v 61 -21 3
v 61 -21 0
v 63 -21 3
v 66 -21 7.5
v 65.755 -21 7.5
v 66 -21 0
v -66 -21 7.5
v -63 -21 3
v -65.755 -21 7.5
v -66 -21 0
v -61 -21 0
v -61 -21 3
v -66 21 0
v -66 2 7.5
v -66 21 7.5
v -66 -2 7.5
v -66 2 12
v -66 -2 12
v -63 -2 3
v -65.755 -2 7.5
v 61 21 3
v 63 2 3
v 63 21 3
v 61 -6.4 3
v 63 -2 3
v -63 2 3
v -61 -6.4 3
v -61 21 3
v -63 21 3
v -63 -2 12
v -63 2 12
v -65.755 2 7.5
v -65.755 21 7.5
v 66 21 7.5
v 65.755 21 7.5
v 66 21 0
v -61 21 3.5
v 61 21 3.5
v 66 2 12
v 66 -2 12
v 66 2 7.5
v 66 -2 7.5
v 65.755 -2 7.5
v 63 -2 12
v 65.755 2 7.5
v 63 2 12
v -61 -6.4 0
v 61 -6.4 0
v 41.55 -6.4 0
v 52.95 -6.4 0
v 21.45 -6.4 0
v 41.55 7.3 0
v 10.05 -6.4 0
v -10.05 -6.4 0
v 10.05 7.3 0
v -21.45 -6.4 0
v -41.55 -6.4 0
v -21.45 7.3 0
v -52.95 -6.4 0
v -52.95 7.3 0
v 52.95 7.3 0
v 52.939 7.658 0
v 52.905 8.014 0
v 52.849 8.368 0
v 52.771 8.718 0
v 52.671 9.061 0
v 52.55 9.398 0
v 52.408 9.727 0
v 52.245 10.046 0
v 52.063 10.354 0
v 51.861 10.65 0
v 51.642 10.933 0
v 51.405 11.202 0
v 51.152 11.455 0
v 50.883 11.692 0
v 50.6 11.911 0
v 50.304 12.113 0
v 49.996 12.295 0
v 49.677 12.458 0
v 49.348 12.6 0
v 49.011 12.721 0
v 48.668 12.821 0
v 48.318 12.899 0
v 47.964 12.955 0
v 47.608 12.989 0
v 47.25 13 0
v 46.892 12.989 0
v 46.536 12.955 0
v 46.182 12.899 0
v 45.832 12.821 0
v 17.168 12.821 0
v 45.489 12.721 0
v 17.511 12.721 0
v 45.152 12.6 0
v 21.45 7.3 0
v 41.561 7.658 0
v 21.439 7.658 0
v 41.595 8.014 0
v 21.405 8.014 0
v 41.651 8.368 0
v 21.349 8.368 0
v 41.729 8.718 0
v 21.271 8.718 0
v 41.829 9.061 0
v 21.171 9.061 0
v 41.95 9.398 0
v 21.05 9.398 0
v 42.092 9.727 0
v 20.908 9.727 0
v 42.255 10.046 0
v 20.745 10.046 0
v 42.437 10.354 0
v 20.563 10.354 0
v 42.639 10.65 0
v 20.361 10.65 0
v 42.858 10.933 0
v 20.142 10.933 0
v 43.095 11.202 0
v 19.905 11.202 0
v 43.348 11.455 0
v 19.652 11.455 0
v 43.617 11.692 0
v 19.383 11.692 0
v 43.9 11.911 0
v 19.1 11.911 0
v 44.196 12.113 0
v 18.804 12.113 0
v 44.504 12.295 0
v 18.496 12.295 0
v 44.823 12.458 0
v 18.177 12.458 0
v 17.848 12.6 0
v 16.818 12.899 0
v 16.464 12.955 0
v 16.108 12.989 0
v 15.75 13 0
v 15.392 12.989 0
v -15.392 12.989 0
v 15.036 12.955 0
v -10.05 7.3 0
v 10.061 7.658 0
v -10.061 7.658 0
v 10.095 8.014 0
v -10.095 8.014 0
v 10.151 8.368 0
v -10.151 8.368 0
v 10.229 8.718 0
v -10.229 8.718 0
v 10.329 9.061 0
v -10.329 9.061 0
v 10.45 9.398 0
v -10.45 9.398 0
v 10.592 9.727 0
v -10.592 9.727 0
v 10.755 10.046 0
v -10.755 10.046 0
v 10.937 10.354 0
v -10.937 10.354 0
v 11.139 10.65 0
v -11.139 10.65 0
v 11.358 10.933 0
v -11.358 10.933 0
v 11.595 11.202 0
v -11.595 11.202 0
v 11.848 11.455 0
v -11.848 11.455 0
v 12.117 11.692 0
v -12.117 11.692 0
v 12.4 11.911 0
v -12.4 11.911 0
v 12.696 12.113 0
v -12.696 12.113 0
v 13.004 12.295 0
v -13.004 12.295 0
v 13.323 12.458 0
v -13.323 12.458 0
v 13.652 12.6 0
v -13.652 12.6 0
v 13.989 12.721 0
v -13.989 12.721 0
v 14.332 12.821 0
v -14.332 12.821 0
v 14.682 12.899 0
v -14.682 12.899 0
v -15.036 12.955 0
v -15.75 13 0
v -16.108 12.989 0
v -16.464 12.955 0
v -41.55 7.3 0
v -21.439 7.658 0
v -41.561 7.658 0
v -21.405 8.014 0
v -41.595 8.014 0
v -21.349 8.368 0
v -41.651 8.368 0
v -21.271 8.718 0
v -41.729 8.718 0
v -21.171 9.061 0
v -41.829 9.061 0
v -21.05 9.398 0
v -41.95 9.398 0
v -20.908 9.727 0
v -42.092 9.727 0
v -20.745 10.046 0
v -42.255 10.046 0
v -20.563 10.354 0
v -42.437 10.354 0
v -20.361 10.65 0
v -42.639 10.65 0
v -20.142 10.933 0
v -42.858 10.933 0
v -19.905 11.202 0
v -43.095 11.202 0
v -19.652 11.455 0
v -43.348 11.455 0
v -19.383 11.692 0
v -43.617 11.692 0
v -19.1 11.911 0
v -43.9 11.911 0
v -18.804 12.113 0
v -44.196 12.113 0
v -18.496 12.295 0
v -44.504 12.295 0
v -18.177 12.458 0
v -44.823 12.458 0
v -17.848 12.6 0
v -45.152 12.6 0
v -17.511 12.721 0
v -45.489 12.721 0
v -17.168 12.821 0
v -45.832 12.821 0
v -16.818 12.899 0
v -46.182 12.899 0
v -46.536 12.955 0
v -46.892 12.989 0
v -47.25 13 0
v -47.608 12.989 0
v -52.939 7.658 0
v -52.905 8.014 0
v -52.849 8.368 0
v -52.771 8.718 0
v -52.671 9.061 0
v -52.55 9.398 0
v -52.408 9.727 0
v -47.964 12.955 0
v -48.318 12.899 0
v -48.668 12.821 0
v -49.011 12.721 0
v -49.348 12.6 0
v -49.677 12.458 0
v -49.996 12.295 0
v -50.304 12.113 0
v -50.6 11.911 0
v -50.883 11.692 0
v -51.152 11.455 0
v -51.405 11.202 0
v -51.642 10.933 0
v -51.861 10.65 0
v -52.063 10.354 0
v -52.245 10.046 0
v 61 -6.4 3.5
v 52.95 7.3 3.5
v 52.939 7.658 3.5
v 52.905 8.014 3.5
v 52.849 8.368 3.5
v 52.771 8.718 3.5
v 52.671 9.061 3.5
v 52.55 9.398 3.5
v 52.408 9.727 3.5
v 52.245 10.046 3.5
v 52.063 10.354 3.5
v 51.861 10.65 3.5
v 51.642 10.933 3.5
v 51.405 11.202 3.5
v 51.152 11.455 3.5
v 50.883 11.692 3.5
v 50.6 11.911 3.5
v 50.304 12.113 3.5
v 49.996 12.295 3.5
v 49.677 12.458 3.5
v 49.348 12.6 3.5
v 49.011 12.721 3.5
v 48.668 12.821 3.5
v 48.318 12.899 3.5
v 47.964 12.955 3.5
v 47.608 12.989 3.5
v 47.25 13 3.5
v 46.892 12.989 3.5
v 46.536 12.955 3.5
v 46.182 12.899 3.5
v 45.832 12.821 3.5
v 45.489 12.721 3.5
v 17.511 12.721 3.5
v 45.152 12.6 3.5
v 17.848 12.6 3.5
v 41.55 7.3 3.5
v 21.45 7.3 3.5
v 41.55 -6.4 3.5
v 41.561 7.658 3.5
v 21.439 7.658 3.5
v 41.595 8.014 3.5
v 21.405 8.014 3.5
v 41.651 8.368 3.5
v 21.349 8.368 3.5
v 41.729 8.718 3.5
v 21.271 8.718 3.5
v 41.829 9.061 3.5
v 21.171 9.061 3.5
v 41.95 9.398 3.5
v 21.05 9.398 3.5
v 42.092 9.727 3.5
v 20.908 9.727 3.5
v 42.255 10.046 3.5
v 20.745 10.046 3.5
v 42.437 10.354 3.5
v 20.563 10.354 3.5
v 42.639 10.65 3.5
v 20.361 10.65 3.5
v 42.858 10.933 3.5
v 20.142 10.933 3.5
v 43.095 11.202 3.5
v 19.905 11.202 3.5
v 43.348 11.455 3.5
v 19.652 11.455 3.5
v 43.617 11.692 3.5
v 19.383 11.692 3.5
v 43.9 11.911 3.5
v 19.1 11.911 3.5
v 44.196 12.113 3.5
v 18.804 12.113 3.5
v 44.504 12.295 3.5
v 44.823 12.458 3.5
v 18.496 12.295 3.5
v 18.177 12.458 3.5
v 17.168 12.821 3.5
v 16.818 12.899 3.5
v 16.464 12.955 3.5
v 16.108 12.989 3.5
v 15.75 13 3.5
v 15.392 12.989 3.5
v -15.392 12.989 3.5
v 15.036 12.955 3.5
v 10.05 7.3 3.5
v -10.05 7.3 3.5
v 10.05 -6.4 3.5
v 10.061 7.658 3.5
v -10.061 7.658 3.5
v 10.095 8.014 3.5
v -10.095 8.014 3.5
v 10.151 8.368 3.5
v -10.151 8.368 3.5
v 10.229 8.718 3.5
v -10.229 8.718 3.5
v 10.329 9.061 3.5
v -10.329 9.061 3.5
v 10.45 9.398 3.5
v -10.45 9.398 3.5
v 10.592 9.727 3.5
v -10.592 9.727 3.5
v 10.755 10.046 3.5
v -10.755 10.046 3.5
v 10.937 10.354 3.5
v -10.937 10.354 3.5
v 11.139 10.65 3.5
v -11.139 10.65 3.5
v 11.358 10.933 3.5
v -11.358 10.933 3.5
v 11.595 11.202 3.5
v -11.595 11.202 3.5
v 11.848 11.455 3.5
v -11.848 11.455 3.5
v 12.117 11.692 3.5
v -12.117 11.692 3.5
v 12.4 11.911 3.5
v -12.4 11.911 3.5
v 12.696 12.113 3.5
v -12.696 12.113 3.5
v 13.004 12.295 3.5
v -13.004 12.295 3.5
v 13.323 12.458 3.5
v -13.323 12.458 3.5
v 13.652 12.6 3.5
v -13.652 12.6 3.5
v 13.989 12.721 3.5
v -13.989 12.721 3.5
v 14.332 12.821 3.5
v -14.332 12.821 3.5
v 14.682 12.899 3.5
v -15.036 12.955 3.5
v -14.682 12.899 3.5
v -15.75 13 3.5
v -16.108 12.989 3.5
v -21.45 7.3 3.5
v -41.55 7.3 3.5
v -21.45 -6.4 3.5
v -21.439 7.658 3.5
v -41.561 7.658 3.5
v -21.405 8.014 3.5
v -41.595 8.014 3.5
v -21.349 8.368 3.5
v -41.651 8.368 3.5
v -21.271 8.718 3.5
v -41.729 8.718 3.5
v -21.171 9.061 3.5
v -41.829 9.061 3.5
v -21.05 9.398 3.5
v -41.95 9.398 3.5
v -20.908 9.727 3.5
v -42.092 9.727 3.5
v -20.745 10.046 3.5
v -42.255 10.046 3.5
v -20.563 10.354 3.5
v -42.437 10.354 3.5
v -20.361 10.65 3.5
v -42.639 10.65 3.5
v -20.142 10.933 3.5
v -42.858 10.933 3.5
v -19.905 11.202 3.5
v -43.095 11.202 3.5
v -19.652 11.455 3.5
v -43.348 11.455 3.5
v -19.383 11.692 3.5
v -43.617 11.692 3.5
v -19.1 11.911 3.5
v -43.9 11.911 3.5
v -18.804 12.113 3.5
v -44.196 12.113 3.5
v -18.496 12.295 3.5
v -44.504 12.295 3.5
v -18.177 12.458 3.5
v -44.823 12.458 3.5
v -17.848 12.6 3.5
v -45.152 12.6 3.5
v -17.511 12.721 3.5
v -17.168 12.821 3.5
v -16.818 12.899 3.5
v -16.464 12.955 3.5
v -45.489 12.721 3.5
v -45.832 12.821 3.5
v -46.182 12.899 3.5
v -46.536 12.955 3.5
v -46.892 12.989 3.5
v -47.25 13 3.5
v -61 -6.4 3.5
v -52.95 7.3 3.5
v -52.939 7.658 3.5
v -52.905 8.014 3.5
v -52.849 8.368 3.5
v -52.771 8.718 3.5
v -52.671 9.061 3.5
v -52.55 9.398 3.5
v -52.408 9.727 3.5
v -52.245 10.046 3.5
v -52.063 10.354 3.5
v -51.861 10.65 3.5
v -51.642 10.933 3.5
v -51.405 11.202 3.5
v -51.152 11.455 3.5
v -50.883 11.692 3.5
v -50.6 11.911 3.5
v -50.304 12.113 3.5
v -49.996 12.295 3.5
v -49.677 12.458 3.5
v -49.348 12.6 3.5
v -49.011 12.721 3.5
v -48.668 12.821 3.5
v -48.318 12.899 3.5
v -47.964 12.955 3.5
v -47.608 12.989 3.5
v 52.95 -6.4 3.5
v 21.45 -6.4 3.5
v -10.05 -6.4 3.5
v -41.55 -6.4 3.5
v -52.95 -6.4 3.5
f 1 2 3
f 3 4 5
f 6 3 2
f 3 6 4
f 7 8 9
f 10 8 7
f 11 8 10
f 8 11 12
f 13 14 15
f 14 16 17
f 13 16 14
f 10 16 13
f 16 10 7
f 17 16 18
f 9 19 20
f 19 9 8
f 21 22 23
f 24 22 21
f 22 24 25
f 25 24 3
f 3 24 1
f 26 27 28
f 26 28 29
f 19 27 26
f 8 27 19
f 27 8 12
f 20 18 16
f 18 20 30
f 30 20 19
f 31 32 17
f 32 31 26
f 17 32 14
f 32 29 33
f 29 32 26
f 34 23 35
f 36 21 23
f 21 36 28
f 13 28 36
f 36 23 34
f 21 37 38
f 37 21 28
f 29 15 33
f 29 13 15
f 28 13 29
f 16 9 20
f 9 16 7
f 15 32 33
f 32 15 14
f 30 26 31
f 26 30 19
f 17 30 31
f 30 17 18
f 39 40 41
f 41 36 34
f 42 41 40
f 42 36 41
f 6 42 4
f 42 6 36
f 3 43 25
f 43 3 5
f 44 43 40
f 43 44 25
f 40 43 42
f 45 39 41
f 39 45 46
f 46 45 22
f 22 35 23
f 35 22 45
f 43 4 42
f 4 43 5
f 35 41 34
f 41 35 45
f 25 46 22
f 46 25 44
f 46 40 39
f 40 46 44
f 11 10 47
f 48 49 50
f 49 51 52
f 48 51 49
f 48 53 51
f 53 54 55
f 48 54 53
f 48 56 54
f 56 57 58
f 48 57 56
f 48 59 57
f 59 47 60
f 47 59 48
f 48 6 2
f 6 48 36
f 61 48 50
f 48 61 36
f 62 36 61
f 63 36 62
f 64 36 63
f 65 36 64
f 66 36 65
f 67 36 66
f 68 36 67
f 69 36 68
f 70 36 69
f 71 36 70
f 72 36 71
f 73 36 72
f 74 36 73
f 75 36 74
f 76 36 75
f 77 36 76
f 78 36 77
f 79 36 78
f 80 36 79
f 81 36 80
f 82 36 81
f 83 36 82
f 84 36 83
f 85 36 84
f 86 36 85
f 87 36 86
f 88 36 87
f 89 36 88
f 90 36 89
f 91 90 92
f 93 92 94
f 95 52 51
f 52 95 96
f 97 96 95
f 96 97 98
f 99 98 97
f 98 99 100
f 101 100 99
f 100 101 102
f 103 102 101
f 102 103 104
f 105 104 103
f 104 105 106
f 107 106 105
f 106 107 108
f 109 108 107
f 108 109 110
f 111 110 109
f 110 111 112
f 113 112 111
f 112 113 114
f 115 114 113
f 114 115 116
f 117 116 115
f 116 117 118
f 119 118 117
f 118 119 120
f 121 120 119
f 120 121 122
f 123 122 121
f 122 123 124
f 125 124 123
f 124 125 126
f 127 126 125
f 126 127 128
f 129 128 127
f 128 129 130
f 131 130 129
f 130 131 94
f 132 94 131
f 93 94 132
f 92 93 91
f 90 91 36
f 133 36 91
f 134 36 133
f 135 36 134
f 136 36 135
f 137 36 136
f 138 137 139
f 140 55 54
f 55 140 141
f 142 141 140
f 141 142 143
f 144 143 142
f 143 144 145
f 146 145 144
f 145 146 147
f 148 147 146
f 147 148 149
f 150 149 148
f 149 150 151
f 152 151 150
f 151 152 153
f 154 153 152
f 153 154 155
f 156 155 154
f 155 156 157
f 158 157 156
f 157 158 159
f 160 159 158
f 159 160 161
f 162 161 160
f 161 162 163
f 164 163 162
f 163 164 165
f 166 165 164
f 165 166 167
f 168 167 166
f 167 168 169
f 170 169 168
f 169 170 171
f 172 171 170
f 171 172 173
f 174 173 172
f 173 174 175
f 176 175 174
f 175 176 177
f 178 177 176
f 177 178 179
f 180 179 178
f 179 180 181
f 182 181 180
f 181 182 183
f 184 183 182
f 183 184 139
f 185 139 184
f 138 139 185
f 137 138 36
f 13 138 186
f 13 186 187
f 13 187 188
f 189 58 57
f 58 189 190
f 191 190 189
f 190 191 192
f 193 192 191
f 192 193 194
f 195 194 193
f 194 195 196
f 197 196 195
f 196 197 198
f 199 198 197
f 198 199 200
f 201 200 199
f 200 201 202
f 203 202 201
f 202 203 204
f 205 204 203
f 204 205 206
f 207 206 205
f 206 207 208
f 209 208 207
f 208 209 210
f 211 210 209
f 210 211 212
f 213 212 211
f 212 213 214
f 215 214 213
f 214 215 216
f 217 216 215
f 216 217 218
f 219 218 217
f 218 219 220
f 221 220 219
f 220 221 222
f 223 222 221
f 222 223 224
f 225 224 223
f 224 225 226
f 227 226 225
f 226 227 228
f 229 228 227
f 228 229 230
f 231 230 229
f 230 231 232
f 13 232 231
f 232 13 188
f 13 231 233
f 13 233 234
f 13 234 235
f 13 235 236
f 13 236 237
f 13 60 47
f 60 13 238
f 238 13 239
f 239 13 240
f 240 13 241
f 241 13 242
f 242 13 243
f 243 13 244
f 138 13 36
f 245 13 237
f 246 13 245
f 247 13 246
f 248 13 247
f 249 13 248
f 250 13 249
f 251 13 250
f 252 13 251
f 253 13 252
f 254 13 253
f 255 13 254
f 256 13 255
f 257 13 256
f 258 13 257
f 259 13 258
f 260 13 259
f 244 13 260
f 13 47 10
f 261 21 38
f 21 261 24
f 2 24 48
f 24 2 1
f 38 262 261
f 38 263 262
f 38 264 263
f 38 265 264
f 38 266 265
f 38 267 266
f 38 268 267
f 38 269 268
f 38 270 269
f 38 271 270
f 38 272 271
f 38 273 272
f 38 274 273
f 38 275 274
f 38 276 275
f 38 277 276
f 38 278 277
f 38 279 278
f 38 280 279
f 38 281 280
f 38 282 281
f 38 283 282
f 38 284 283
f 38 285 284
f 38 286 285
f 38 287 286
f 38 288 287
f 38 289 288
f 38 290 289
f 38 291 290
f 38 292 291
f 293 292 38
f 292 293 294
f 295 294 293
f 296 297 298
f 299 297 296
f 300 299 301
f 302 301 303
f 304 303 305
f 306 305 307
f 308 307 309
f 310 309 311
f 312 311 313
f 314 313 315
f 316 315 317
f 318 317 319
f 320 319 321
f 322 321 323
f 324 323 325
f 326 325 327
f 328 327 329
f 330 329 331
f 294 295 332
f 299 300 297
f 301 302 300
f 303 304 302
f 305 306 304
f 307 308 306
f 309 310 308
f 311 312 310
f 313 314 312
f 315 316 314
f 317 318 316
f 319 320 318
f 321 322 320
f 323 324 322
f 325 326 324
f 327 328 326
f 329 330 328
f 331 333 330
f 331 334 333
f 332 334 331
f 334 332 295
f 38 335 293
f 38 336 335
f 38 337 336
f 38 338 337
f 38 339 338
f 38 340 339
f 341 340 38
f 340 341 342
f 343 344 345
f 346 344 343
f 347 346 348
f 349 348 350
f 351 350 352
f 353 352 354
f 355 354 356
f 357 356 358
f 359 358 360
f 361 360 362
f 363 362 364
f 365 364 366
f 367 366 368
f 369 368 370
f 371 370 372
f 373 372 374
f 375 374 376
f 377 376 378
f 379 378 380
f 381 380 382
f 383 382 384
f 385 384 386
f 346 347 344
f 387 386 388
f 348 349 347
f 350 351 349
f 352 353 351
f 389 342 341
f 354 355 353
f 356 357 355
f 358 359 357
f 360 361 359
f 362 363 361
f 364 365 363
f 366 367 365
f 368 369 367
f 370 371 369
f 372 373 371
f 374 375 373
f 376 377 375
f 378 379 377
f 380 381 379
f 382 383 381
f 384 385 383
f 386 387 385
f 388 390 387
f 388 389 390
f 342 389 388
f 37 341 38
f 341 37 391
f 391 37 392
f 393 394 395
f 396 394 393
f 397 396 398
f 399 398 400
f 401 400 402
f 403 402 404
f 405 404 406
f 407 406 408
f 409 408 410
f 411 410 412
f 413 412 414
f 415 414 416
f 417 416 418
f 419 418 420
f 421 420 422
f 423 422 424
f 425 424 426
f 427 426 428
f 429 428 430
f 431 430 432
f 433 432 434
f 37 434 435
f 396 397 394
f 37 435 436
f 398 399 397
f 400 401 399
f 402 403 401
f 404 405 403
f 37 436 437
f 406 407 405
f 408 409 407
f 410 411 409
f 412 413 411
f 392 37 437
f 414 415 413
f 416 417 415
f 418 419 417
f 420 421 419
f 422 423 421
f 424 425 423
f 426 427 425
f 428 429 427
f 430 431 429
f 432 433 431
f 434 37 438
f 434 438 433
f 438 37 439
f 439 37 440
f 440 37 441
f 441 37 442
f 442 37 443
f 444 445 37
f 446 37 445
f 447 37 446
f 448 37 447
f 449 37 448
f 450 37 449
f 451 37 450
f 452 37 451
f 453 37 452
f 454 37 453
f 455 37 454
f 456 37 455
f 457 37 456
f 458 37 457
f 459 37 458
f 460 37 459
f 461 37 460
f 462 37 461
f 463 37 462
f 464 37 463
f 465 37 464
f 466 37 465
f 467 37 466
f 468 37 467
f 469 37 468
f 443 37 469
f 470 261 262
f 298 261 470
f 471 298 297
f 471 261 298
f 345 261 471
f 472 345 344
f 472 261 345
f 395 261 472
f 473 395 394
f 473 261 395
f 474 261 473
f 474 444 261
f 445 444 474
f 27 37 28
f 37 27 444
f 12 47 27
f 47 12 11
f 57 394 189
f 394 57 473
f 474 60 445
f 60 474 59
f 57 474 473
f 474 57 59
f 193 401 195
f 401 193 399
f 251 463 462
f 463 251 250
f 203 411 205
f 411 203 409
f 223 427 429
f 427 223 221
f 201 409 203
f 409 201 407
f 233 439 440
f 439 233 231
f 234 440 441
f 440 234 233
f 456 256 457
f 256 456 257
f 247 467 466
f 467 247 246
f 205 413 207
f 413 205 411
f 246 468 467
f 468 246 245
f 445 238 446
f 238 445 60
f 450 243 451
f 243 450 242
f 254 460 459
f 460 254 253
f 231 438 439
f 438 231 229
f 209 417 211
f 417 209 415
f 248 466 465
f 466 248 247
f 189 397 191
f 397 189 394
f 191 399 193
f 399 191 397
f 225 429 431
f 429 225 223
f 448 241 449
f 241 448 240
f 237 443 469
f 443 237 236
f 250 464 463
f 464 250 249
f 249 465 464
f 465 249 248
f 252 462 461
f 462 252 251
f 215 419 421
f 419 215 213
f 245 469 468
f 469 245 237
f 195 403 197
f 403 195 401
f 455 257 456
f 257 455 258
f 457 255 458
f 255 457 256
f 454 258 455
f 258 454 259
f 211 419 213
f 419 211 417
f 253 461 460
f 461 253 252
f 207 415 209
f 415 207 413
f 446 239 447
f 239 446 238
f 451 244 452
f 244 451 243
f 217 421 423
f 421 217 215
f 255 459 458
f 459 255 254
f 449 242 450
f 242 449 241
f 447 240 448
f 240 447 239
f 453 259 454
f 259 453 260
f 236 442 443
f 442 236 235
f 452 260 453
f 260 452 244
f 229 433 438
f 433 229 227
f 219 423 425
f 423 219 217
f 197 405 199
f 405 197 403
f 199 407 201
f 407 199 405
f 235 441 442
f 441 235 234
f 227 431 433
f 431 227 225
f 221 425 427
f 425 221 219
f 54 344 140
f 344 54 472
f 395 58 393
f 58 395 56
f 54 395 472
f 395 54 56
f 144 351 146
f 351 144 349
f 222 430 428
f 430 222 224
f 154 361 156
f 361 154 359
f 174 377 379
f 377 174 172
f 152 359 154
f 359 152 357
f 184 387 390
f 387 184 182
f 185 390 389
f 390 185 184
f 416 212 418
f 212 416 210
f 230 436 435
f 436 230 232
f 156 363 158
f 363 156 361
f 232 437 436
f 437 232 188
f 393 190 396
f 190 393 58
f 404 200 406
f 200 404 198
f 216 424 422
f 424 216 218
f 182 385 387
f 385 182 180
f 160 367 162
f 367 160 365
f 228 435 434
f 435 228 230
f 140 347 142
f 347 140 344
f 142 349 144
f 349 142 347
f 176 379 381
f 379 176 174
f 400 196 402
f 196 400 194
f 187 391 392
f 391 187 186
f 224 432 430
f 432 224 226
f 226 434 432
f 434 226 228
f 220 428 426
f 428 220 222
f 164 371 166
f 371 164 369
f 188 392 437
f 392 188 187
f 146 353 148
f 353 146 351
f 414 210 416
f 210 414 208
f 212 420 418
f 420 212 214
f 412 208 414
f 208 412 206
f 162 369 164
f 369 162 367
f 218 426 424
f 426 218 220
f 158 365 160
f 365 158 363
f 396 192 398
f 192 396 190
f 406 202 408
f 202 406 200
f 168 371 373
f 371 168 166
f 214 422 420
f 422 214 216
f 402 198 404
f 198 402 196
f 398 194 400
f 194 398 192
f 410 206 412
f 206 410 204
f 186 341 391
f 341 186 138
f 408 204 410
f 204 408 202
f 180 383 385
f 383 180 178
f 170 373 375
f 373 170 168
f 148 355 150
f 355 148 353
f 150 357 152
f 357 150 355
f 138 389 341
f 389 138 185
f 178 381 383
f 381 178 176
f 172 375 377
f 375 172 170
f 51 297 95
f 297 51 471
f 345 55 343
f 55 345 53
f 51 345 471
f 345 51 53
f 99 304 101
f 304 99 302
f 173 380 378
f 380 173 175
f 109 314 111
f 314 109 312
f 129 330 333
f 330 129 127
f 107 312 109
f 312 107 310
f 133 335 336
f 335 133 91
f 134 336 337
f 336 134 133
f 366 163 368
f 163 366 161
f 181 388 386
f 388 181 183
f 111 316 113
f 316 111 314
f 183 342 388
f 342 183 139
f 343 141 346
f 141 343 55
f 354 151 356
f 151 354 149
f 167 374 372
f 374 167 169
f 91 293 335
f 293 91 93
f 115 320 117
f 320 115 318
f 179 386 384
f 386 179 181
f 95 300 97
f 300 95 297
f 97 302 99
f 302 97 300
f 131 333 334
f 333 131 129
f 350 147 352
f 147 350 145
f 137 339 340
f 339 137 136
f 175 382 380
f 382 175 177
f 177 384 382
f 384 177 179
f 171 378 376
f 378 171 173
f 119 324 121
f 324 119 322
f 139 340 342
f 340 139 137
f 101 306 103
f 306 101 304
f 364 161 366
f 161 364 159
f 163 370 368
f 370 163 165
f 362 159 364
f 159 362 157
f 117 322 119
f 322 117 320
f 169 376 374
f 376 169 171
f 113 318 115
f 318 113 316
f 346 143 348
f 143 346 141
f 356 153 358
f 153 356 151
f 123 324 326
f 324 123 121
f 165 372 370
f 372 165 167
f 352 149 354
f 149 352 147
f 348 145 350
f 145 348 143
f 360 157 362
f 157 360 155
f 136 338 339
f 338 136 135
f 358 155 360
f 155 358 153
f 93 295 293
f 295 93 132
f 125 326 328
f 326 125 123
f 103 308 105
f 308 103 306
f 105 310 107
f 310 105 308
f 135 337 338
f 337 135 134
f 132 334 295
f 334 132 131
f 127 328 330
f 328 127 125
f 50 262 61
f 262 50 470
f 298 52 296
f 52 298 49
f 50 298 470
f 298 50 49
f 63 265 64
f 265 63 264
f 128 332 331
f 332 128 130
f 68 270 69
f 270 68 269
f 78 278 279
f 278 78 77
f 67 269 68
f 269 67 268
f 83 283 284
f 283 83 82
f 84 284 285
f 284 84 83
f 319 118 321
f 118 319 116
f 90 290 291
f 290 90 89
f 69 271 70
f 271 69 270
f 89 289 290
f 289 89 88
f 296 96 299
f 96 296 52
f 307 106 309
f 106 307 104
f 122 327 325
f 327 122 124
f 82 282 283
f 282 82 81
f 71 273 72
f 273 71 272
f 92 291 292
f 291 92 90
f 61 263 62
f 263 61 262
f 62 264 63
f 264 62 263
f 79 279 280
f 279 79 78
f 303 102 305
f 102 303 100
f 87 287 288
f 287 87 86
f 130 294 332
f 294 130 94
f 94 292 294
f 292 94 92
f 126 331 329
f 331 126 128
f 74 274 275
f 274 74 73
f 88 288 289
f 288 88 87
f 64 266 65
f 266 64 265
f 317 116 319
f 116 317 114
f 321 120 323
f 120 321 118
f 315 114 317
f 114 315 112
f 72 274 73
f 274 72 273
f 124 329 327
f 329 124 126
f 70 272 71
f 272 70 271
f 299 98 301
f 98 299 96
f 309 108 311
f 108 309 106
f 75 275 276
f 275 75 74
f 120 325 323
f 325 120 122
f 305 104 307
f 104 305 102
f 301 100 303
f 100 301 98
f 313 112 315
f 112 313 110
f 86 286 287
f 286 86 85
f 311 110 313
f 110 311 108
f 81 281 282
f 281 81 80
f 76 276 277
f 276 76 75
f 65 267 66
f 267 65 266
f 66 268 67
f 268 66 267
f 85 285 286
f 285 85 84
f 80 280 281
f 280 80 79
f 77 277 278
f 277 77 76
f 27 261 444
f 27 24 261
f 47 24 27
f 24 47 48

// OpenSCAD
// file: constants.scad
// Copyright Ian G. Clifton 2026
// Apache 2.0 license
// https://github.com/IanGClifton/modular-paint-stack

GRIDFINITY_DIMENSION = 42;
CIRCLE_RESOLUTION = 100;

SHELF_SUPPORT_WIDTH = 3;
SHELF_SUPPORT_BLOCK_PROTRUSION = 9;
SHELF_SUPPORT_BLOCK_X = 3;
SHELF_SUPPORT_BLOCK_Y = 4;
SHELF_SUPPORT_ANGLE_X = 3;
SHELF_SUPPORT_ANGLE_Y = (GRIDFINITY_DIMENSION - SHELF_SUPPORT_BLOCK_Y) / 2;
SHELF_SUPPORT_ANGLE_PROTRUSION = 4.9;
SHELF_SUPPORT_SPACING = 2;
SHELF_SUPPORT_ANGLE_CUT = 0.4;

SHELF_THICKNESS = 3;
SHELF_MIN_BACK_RAIL = 8;

SIDE_X = 8;
SIDE_Y = GRIDFINITY_DIMENSION;

DOVETAIL_XMIN = 3.0;
DOVETAIL_XMAX = 4.0;
DOVETAIL_YDEPTH = 3.0;
DOVETAIL_ZDIFF = 5.0;
DOVETAIL_ZMAX = 30.0;
DOVETAIL_ZMIN = DOVETAIL_ZMAX - DOVETAIL_ZDIFF;
DOVETAIL_OFFSET = (SIDE_X / 2) - (DOVETAIL_XMAX / 2);

SHELF_BRACKET_WIDTH = 2;
SHELF_BRACKET_OPENING_HEIGHT = 5;
SHELF_BRACKET_OPENING_WIDTH = 3;
SHELF_BRACKET_CONNECTION_HEIGHT = 4;
SHELF_BRACKET_Y_DEPTH = 19;
SHELF_BRACKET_Y_GAP = 4;

CUTOUT_SHAPE_NONE = 0;
CUTOUT_SHAPE_OVAL = 1;
CUTOUT_SHAPE_RECTANGLE = 2;
CUTOUT_SHAPE_ANGLED_RECTANGLE = 3;

function getShelfMainWidth(gridfinityUnits) = GRIDFINITY_DIMENSION * gridfinityUnits;

function getShelfFullWidth(gridfinityUnits) = (SHELF_SUPPORT_WIDTH * 2) + getShelfMainWidth(gridfinityUnits);
// file: shelf_base.scad
// Copyright Ian G. Clifton 2026
// Apache 2.0 license
// https://github.com/IanGClifton/modular-paint-stack

include <constants.scad>

/**
  * Creates an empty shelf
  *
  * The shelf has the support pieces to fit into the walls,
  * but the top of the shelf is flat with no cutouts for
  * paints, brushes, etc.
  */
module uniformShelf(gridfinityWidth) {
    union() {
        // Shelf main
        cube([getShelfFullWidth(gridfinityWidth), GRIDFINITY_DIMENSION, SHELF_THICKNESS]);
        
        // Support on each end
        shelfSupport();
        translate([getShelfFullWidth(gridfinityWidth), 0, 0])
            mirror([1, 0, 0])
                shelfSupport();
    }
}

/**
  * Modifies the uniformShelf() to be thicker or thinner
  *
  * This adjusts only the center of the shelf where paints
  * would go, allowing the thickness of this part of the shelf
  * to match the paint neck height.
  */
module thicknessAdjustedShelf(gridfinityWidth, targetThickness) {
    if (targetThickness == SHELF_THICKNESS) {
        uniformShelf(gridfinityWidth);
    } else if (targetThickness > SHELF_THICKNESS) {
        // Thicken the shelf
        union() {
            uniformShelf(gridfinityWidth);
            translate([SHELF_SUPPORT_WIDTH + SHELF_SUPPORT_SPACING, 0, SHELF_THICKNESS])
                cube([getShelfMainWidth(gridfinityWidth) - (SHELF_SUPPORT_SPACING * 2), GRIDFINITY_DIMENSION, targetThickness - SHELF_THICKNESS]);
        }
    } else {
        // Thin the shelf
        difference() {
            uniformShelf(gridfinityWidth);
            translate([SHELF_SUPPORT_WIDTH + SHELF_SUPPORT_SPACING, 0, targetThickness])
                cube([getShelfMainWidth(gridfinityWidth) - (SHELF_SUPPORT_SPACING * 2), GRIDFINITY_DIMENSION, SHELF_THICKNESS - targetThickness]);
        }
    }
}

/**
  * Creates the two triangles and center block used to connect
  * the shelf to the shelf brackets on the sides
  */
module shelfSupport() {
    topPoint = SHELF_THICKNESS + SHELF_SUPPORT_ANGLE_PROTRUSION;
    triangle_points = [
        // Front
        [0, 0, topPoint],                             // 0 TL
        [SHELF_SUPPORT_BLOCK_X, 0, SHELF_THICKNESS],  // 1 BR
        [0, 0, SHELF_THICKNESS],                      // 2 BL
        // Back
        [0, SHELF_SUPPORT_ANGLE_Y, topPoint],                            // 3 TL
        [SHELF_SUPPORT_BLOCK_X, SHELF_SUPPORT_ANGLE_Y, SHELF_THICKNESS], // 4 BR
        [0, SHELF_SUPPORT_ANGLE_Y, SHELF_THICKNESS]                      // 5 BL
    ];
    triangle_faces = [
        [0, 1, 2],    // Front face
        [3, 5, 4],    // Back face
        [3, 0, 2, 5], // Left side
        [3, 4, 1, 0], // Top
        [2, 1, 4, 5]  // Bottom  
    ];
    triangle_offset = SHELF_SUPPORT_ANGLE_Y + SHELF_SUPPORT_BLOCK_Y;
    union() {
        difference() {
            // Two triangles
            for (i = [0 : 1]) {
                translate([0, i * triangle_offset, 0])
                polyhedron(points = triangle_points, faces = triangle_faces);
            }
            // Cube to "cut" the tip of the triangles
            translate([0, 0, topPoint - SHELF_SUPPORT_ANGLE_CUT])
                cube([SHELF_SUPPORT_BLOCK_X, (SHELF_SUPPORT_ANGLE_Y * 2) + SHELF_SUPPORT_BLOCK_Y, SHELF_SUPPORT_ANGLE_CUT]);
        }
        // Add the block protrusion
        translate([0, SHELF_SUPPORT_ANGLE_Y, SHELF_THICKNESS])
            cube([SHELF_SUPPORT_BLOCK_X, SHELF_SUPPORT_BLOCK_Y, SHELF_SUPPORT_BLOCK_PROTRUSION]);
    }
}
// main file
// Copyright Ian G. Clifton 2026
// Apache 2.0 license
// https://github.com/IanGClifton/modular-paint-stack

// mm thickness between the paint cap and paint tube body
paint_neck_height = 3.5;
// mm diameter of the paint tube's "neck"
paint_neck_diameter = 11.4;
// Number of cutouts for paint
paint_count = 4;
// mm extra to extend paint supports if possible
paint_support_extra_length = 8;
// Gridfinity units (42mm each) to make the width of the inner shelf part  
shelf_gridfinity_unit_width = 3;

include <shelf_base.scad>

// Calculate the paint holes
PAINT_SPACING = (getShelfMainWidth(shelf_gridfinity_unit_width) - (paint_count * paint_neck_diameter)) / paint_count;
PAINT_CUT_Z = max(SHELF_THICKNESS, paint_neck_height);
PAINT_FINGER_Y = max(GRIDFINITY_DIMENSION - (SHELF_MIN_BACK_RAIL + paint_neck_diameter + paint_support_extra_length), 0);

/**
  * Creates a rectangle and a circle to cut out where the paint tube slides in
  *
  * yDepth distance from the start to the end of the rect that aligns with the circle center
  * diameter width of the circle and the rectangle
  * thickness how tall the rectangle is and how high to extrude the circle
*/
module roundHoleCutOut(yDepth, diameter, thickness) {
    union() {
        cube([diameter, yDepth, thickness]);
        translate([diameter / 2, yDepth]) 
            linear_extrude(thickness)
                circle(d = diameter, $fn=CIRCLE_RESOLUTION);        
    }
}

/**
  * Creates the cutting "tool" that will represents what should be removed
  * from the shelf for the paints to slide in
  */
module paintToolShape() {
  union() {
      translate([SHELF_SUPPORT_WIDTH + (PAINT_SPACING / 2),   PAINT_FINGER_Y, 0])
        for(i = [0 : paint_count - 1]) {
            X_OFFSET = (i * paint_neck_diameter) + (i * PAINT_SPACING);
      
            translate([X_OFFSET, 0, 0])
                roundHoleCutOut((paint_neck_diameter / 2) + paint_support_extra_length, paint_neck_diameter, PAINT_CUT_Z);
        }

    translate([SHELF_SUPPORT_WIDTH + SHELF_SUPPORT_SPACING, 0, 0])
        cube([getShelfMainWidth(shelf_gridfinity_unit_width) - (SHELF_SUPPORT_SPACING * 2), PAINT_FINGER_Y, PAINT_CUT_Z]);
    }  
}

/**
  * Draws the triangular pieces that connect from the outside edge of the
  * first and last paint cutout to the inside front edge of the support
  *
  * These aren't strickly triangles, as they have to account for the small
  * gap between the support and the main part of the shelf, which has a
  * different thickness than the support part.
  */
module shelfTriangles() {
    SHELF_INNER_THICKNESS = SHELF_THICKNESS + (paint_neck_height - SHELF_THICKNESS);
    
    // Defined from left to right, back to front, top to bottom
    TRIANGLE_SUPPORT_POINTS = [
        // Highest two 0, 1 
        [SHELF_SUPPORT_SPACING, PAINT_FINGER_Y, SHELF_INNER_THICKNESS],
        [(PAINT_SPACING / 2), PAINT_FINGER_Y, SHELF_INNER_THICKNESS],
        // Outside front 2
        [SHELF_SUPPORT_SPACING, 0, SHELF_THICKNESS],
        // Lowest three 3, 4, 5
        [SHELF_SUPPORT_SPACING, PAINT_FINGER_Y, 0],
        [(PAINT_SPACING / 2), PAINT_FINGER_Y, 0],
        [SHELF_SUPPORT_SPACING, 0, 0],
    ];
    
    TRIANGLE_SUPPORT_FACES = [
        [0, 1, 2],    // Top triangle
        [0, 2, 5, 3], // Outside rectangle
        [2, 1, 4, 5], // Inner rectangle
        [1, 4, 3, 0], // Back rectangle
        [5, 4, 3],    // Bottom triangle
     ];
    translate([SHELF_SUPPORT_WIDTH, 0, 0])
        polyhedron(points = TRIANGLE_SUPPORT_POINTS, faces = TRIANGLE_SUPPORT_FACES);
    translate([getShelfFullWidth(shelf_gridfinity_unit_width) - SHELF_SUPPORT_WIDTH, 0, 0])
        mirror([1, 0, 0])
            polyhedron(points = TRIANGLE_SUPPORT_POINTS, faces = TRIANGLE_SUPPORT_FACES);
}

/**
  * Creates a shelf with cutouts for paint and triangle supports on the end
  */
module paintTubeShelf() {
    union() {
        difference() {
            thicknessAdjustedShelf(shelf_gridfinity_unit_width, paint_neck_height);
            paintToolShape();
        }
        shelfTriangles();
    }
}

translate([-getShelfFullWidth(shelf_gridfinity_unit_width) / 2, -GRIDFINITY_DIMENSION / 2, 0]) {
    paintTubeShelf();
}
